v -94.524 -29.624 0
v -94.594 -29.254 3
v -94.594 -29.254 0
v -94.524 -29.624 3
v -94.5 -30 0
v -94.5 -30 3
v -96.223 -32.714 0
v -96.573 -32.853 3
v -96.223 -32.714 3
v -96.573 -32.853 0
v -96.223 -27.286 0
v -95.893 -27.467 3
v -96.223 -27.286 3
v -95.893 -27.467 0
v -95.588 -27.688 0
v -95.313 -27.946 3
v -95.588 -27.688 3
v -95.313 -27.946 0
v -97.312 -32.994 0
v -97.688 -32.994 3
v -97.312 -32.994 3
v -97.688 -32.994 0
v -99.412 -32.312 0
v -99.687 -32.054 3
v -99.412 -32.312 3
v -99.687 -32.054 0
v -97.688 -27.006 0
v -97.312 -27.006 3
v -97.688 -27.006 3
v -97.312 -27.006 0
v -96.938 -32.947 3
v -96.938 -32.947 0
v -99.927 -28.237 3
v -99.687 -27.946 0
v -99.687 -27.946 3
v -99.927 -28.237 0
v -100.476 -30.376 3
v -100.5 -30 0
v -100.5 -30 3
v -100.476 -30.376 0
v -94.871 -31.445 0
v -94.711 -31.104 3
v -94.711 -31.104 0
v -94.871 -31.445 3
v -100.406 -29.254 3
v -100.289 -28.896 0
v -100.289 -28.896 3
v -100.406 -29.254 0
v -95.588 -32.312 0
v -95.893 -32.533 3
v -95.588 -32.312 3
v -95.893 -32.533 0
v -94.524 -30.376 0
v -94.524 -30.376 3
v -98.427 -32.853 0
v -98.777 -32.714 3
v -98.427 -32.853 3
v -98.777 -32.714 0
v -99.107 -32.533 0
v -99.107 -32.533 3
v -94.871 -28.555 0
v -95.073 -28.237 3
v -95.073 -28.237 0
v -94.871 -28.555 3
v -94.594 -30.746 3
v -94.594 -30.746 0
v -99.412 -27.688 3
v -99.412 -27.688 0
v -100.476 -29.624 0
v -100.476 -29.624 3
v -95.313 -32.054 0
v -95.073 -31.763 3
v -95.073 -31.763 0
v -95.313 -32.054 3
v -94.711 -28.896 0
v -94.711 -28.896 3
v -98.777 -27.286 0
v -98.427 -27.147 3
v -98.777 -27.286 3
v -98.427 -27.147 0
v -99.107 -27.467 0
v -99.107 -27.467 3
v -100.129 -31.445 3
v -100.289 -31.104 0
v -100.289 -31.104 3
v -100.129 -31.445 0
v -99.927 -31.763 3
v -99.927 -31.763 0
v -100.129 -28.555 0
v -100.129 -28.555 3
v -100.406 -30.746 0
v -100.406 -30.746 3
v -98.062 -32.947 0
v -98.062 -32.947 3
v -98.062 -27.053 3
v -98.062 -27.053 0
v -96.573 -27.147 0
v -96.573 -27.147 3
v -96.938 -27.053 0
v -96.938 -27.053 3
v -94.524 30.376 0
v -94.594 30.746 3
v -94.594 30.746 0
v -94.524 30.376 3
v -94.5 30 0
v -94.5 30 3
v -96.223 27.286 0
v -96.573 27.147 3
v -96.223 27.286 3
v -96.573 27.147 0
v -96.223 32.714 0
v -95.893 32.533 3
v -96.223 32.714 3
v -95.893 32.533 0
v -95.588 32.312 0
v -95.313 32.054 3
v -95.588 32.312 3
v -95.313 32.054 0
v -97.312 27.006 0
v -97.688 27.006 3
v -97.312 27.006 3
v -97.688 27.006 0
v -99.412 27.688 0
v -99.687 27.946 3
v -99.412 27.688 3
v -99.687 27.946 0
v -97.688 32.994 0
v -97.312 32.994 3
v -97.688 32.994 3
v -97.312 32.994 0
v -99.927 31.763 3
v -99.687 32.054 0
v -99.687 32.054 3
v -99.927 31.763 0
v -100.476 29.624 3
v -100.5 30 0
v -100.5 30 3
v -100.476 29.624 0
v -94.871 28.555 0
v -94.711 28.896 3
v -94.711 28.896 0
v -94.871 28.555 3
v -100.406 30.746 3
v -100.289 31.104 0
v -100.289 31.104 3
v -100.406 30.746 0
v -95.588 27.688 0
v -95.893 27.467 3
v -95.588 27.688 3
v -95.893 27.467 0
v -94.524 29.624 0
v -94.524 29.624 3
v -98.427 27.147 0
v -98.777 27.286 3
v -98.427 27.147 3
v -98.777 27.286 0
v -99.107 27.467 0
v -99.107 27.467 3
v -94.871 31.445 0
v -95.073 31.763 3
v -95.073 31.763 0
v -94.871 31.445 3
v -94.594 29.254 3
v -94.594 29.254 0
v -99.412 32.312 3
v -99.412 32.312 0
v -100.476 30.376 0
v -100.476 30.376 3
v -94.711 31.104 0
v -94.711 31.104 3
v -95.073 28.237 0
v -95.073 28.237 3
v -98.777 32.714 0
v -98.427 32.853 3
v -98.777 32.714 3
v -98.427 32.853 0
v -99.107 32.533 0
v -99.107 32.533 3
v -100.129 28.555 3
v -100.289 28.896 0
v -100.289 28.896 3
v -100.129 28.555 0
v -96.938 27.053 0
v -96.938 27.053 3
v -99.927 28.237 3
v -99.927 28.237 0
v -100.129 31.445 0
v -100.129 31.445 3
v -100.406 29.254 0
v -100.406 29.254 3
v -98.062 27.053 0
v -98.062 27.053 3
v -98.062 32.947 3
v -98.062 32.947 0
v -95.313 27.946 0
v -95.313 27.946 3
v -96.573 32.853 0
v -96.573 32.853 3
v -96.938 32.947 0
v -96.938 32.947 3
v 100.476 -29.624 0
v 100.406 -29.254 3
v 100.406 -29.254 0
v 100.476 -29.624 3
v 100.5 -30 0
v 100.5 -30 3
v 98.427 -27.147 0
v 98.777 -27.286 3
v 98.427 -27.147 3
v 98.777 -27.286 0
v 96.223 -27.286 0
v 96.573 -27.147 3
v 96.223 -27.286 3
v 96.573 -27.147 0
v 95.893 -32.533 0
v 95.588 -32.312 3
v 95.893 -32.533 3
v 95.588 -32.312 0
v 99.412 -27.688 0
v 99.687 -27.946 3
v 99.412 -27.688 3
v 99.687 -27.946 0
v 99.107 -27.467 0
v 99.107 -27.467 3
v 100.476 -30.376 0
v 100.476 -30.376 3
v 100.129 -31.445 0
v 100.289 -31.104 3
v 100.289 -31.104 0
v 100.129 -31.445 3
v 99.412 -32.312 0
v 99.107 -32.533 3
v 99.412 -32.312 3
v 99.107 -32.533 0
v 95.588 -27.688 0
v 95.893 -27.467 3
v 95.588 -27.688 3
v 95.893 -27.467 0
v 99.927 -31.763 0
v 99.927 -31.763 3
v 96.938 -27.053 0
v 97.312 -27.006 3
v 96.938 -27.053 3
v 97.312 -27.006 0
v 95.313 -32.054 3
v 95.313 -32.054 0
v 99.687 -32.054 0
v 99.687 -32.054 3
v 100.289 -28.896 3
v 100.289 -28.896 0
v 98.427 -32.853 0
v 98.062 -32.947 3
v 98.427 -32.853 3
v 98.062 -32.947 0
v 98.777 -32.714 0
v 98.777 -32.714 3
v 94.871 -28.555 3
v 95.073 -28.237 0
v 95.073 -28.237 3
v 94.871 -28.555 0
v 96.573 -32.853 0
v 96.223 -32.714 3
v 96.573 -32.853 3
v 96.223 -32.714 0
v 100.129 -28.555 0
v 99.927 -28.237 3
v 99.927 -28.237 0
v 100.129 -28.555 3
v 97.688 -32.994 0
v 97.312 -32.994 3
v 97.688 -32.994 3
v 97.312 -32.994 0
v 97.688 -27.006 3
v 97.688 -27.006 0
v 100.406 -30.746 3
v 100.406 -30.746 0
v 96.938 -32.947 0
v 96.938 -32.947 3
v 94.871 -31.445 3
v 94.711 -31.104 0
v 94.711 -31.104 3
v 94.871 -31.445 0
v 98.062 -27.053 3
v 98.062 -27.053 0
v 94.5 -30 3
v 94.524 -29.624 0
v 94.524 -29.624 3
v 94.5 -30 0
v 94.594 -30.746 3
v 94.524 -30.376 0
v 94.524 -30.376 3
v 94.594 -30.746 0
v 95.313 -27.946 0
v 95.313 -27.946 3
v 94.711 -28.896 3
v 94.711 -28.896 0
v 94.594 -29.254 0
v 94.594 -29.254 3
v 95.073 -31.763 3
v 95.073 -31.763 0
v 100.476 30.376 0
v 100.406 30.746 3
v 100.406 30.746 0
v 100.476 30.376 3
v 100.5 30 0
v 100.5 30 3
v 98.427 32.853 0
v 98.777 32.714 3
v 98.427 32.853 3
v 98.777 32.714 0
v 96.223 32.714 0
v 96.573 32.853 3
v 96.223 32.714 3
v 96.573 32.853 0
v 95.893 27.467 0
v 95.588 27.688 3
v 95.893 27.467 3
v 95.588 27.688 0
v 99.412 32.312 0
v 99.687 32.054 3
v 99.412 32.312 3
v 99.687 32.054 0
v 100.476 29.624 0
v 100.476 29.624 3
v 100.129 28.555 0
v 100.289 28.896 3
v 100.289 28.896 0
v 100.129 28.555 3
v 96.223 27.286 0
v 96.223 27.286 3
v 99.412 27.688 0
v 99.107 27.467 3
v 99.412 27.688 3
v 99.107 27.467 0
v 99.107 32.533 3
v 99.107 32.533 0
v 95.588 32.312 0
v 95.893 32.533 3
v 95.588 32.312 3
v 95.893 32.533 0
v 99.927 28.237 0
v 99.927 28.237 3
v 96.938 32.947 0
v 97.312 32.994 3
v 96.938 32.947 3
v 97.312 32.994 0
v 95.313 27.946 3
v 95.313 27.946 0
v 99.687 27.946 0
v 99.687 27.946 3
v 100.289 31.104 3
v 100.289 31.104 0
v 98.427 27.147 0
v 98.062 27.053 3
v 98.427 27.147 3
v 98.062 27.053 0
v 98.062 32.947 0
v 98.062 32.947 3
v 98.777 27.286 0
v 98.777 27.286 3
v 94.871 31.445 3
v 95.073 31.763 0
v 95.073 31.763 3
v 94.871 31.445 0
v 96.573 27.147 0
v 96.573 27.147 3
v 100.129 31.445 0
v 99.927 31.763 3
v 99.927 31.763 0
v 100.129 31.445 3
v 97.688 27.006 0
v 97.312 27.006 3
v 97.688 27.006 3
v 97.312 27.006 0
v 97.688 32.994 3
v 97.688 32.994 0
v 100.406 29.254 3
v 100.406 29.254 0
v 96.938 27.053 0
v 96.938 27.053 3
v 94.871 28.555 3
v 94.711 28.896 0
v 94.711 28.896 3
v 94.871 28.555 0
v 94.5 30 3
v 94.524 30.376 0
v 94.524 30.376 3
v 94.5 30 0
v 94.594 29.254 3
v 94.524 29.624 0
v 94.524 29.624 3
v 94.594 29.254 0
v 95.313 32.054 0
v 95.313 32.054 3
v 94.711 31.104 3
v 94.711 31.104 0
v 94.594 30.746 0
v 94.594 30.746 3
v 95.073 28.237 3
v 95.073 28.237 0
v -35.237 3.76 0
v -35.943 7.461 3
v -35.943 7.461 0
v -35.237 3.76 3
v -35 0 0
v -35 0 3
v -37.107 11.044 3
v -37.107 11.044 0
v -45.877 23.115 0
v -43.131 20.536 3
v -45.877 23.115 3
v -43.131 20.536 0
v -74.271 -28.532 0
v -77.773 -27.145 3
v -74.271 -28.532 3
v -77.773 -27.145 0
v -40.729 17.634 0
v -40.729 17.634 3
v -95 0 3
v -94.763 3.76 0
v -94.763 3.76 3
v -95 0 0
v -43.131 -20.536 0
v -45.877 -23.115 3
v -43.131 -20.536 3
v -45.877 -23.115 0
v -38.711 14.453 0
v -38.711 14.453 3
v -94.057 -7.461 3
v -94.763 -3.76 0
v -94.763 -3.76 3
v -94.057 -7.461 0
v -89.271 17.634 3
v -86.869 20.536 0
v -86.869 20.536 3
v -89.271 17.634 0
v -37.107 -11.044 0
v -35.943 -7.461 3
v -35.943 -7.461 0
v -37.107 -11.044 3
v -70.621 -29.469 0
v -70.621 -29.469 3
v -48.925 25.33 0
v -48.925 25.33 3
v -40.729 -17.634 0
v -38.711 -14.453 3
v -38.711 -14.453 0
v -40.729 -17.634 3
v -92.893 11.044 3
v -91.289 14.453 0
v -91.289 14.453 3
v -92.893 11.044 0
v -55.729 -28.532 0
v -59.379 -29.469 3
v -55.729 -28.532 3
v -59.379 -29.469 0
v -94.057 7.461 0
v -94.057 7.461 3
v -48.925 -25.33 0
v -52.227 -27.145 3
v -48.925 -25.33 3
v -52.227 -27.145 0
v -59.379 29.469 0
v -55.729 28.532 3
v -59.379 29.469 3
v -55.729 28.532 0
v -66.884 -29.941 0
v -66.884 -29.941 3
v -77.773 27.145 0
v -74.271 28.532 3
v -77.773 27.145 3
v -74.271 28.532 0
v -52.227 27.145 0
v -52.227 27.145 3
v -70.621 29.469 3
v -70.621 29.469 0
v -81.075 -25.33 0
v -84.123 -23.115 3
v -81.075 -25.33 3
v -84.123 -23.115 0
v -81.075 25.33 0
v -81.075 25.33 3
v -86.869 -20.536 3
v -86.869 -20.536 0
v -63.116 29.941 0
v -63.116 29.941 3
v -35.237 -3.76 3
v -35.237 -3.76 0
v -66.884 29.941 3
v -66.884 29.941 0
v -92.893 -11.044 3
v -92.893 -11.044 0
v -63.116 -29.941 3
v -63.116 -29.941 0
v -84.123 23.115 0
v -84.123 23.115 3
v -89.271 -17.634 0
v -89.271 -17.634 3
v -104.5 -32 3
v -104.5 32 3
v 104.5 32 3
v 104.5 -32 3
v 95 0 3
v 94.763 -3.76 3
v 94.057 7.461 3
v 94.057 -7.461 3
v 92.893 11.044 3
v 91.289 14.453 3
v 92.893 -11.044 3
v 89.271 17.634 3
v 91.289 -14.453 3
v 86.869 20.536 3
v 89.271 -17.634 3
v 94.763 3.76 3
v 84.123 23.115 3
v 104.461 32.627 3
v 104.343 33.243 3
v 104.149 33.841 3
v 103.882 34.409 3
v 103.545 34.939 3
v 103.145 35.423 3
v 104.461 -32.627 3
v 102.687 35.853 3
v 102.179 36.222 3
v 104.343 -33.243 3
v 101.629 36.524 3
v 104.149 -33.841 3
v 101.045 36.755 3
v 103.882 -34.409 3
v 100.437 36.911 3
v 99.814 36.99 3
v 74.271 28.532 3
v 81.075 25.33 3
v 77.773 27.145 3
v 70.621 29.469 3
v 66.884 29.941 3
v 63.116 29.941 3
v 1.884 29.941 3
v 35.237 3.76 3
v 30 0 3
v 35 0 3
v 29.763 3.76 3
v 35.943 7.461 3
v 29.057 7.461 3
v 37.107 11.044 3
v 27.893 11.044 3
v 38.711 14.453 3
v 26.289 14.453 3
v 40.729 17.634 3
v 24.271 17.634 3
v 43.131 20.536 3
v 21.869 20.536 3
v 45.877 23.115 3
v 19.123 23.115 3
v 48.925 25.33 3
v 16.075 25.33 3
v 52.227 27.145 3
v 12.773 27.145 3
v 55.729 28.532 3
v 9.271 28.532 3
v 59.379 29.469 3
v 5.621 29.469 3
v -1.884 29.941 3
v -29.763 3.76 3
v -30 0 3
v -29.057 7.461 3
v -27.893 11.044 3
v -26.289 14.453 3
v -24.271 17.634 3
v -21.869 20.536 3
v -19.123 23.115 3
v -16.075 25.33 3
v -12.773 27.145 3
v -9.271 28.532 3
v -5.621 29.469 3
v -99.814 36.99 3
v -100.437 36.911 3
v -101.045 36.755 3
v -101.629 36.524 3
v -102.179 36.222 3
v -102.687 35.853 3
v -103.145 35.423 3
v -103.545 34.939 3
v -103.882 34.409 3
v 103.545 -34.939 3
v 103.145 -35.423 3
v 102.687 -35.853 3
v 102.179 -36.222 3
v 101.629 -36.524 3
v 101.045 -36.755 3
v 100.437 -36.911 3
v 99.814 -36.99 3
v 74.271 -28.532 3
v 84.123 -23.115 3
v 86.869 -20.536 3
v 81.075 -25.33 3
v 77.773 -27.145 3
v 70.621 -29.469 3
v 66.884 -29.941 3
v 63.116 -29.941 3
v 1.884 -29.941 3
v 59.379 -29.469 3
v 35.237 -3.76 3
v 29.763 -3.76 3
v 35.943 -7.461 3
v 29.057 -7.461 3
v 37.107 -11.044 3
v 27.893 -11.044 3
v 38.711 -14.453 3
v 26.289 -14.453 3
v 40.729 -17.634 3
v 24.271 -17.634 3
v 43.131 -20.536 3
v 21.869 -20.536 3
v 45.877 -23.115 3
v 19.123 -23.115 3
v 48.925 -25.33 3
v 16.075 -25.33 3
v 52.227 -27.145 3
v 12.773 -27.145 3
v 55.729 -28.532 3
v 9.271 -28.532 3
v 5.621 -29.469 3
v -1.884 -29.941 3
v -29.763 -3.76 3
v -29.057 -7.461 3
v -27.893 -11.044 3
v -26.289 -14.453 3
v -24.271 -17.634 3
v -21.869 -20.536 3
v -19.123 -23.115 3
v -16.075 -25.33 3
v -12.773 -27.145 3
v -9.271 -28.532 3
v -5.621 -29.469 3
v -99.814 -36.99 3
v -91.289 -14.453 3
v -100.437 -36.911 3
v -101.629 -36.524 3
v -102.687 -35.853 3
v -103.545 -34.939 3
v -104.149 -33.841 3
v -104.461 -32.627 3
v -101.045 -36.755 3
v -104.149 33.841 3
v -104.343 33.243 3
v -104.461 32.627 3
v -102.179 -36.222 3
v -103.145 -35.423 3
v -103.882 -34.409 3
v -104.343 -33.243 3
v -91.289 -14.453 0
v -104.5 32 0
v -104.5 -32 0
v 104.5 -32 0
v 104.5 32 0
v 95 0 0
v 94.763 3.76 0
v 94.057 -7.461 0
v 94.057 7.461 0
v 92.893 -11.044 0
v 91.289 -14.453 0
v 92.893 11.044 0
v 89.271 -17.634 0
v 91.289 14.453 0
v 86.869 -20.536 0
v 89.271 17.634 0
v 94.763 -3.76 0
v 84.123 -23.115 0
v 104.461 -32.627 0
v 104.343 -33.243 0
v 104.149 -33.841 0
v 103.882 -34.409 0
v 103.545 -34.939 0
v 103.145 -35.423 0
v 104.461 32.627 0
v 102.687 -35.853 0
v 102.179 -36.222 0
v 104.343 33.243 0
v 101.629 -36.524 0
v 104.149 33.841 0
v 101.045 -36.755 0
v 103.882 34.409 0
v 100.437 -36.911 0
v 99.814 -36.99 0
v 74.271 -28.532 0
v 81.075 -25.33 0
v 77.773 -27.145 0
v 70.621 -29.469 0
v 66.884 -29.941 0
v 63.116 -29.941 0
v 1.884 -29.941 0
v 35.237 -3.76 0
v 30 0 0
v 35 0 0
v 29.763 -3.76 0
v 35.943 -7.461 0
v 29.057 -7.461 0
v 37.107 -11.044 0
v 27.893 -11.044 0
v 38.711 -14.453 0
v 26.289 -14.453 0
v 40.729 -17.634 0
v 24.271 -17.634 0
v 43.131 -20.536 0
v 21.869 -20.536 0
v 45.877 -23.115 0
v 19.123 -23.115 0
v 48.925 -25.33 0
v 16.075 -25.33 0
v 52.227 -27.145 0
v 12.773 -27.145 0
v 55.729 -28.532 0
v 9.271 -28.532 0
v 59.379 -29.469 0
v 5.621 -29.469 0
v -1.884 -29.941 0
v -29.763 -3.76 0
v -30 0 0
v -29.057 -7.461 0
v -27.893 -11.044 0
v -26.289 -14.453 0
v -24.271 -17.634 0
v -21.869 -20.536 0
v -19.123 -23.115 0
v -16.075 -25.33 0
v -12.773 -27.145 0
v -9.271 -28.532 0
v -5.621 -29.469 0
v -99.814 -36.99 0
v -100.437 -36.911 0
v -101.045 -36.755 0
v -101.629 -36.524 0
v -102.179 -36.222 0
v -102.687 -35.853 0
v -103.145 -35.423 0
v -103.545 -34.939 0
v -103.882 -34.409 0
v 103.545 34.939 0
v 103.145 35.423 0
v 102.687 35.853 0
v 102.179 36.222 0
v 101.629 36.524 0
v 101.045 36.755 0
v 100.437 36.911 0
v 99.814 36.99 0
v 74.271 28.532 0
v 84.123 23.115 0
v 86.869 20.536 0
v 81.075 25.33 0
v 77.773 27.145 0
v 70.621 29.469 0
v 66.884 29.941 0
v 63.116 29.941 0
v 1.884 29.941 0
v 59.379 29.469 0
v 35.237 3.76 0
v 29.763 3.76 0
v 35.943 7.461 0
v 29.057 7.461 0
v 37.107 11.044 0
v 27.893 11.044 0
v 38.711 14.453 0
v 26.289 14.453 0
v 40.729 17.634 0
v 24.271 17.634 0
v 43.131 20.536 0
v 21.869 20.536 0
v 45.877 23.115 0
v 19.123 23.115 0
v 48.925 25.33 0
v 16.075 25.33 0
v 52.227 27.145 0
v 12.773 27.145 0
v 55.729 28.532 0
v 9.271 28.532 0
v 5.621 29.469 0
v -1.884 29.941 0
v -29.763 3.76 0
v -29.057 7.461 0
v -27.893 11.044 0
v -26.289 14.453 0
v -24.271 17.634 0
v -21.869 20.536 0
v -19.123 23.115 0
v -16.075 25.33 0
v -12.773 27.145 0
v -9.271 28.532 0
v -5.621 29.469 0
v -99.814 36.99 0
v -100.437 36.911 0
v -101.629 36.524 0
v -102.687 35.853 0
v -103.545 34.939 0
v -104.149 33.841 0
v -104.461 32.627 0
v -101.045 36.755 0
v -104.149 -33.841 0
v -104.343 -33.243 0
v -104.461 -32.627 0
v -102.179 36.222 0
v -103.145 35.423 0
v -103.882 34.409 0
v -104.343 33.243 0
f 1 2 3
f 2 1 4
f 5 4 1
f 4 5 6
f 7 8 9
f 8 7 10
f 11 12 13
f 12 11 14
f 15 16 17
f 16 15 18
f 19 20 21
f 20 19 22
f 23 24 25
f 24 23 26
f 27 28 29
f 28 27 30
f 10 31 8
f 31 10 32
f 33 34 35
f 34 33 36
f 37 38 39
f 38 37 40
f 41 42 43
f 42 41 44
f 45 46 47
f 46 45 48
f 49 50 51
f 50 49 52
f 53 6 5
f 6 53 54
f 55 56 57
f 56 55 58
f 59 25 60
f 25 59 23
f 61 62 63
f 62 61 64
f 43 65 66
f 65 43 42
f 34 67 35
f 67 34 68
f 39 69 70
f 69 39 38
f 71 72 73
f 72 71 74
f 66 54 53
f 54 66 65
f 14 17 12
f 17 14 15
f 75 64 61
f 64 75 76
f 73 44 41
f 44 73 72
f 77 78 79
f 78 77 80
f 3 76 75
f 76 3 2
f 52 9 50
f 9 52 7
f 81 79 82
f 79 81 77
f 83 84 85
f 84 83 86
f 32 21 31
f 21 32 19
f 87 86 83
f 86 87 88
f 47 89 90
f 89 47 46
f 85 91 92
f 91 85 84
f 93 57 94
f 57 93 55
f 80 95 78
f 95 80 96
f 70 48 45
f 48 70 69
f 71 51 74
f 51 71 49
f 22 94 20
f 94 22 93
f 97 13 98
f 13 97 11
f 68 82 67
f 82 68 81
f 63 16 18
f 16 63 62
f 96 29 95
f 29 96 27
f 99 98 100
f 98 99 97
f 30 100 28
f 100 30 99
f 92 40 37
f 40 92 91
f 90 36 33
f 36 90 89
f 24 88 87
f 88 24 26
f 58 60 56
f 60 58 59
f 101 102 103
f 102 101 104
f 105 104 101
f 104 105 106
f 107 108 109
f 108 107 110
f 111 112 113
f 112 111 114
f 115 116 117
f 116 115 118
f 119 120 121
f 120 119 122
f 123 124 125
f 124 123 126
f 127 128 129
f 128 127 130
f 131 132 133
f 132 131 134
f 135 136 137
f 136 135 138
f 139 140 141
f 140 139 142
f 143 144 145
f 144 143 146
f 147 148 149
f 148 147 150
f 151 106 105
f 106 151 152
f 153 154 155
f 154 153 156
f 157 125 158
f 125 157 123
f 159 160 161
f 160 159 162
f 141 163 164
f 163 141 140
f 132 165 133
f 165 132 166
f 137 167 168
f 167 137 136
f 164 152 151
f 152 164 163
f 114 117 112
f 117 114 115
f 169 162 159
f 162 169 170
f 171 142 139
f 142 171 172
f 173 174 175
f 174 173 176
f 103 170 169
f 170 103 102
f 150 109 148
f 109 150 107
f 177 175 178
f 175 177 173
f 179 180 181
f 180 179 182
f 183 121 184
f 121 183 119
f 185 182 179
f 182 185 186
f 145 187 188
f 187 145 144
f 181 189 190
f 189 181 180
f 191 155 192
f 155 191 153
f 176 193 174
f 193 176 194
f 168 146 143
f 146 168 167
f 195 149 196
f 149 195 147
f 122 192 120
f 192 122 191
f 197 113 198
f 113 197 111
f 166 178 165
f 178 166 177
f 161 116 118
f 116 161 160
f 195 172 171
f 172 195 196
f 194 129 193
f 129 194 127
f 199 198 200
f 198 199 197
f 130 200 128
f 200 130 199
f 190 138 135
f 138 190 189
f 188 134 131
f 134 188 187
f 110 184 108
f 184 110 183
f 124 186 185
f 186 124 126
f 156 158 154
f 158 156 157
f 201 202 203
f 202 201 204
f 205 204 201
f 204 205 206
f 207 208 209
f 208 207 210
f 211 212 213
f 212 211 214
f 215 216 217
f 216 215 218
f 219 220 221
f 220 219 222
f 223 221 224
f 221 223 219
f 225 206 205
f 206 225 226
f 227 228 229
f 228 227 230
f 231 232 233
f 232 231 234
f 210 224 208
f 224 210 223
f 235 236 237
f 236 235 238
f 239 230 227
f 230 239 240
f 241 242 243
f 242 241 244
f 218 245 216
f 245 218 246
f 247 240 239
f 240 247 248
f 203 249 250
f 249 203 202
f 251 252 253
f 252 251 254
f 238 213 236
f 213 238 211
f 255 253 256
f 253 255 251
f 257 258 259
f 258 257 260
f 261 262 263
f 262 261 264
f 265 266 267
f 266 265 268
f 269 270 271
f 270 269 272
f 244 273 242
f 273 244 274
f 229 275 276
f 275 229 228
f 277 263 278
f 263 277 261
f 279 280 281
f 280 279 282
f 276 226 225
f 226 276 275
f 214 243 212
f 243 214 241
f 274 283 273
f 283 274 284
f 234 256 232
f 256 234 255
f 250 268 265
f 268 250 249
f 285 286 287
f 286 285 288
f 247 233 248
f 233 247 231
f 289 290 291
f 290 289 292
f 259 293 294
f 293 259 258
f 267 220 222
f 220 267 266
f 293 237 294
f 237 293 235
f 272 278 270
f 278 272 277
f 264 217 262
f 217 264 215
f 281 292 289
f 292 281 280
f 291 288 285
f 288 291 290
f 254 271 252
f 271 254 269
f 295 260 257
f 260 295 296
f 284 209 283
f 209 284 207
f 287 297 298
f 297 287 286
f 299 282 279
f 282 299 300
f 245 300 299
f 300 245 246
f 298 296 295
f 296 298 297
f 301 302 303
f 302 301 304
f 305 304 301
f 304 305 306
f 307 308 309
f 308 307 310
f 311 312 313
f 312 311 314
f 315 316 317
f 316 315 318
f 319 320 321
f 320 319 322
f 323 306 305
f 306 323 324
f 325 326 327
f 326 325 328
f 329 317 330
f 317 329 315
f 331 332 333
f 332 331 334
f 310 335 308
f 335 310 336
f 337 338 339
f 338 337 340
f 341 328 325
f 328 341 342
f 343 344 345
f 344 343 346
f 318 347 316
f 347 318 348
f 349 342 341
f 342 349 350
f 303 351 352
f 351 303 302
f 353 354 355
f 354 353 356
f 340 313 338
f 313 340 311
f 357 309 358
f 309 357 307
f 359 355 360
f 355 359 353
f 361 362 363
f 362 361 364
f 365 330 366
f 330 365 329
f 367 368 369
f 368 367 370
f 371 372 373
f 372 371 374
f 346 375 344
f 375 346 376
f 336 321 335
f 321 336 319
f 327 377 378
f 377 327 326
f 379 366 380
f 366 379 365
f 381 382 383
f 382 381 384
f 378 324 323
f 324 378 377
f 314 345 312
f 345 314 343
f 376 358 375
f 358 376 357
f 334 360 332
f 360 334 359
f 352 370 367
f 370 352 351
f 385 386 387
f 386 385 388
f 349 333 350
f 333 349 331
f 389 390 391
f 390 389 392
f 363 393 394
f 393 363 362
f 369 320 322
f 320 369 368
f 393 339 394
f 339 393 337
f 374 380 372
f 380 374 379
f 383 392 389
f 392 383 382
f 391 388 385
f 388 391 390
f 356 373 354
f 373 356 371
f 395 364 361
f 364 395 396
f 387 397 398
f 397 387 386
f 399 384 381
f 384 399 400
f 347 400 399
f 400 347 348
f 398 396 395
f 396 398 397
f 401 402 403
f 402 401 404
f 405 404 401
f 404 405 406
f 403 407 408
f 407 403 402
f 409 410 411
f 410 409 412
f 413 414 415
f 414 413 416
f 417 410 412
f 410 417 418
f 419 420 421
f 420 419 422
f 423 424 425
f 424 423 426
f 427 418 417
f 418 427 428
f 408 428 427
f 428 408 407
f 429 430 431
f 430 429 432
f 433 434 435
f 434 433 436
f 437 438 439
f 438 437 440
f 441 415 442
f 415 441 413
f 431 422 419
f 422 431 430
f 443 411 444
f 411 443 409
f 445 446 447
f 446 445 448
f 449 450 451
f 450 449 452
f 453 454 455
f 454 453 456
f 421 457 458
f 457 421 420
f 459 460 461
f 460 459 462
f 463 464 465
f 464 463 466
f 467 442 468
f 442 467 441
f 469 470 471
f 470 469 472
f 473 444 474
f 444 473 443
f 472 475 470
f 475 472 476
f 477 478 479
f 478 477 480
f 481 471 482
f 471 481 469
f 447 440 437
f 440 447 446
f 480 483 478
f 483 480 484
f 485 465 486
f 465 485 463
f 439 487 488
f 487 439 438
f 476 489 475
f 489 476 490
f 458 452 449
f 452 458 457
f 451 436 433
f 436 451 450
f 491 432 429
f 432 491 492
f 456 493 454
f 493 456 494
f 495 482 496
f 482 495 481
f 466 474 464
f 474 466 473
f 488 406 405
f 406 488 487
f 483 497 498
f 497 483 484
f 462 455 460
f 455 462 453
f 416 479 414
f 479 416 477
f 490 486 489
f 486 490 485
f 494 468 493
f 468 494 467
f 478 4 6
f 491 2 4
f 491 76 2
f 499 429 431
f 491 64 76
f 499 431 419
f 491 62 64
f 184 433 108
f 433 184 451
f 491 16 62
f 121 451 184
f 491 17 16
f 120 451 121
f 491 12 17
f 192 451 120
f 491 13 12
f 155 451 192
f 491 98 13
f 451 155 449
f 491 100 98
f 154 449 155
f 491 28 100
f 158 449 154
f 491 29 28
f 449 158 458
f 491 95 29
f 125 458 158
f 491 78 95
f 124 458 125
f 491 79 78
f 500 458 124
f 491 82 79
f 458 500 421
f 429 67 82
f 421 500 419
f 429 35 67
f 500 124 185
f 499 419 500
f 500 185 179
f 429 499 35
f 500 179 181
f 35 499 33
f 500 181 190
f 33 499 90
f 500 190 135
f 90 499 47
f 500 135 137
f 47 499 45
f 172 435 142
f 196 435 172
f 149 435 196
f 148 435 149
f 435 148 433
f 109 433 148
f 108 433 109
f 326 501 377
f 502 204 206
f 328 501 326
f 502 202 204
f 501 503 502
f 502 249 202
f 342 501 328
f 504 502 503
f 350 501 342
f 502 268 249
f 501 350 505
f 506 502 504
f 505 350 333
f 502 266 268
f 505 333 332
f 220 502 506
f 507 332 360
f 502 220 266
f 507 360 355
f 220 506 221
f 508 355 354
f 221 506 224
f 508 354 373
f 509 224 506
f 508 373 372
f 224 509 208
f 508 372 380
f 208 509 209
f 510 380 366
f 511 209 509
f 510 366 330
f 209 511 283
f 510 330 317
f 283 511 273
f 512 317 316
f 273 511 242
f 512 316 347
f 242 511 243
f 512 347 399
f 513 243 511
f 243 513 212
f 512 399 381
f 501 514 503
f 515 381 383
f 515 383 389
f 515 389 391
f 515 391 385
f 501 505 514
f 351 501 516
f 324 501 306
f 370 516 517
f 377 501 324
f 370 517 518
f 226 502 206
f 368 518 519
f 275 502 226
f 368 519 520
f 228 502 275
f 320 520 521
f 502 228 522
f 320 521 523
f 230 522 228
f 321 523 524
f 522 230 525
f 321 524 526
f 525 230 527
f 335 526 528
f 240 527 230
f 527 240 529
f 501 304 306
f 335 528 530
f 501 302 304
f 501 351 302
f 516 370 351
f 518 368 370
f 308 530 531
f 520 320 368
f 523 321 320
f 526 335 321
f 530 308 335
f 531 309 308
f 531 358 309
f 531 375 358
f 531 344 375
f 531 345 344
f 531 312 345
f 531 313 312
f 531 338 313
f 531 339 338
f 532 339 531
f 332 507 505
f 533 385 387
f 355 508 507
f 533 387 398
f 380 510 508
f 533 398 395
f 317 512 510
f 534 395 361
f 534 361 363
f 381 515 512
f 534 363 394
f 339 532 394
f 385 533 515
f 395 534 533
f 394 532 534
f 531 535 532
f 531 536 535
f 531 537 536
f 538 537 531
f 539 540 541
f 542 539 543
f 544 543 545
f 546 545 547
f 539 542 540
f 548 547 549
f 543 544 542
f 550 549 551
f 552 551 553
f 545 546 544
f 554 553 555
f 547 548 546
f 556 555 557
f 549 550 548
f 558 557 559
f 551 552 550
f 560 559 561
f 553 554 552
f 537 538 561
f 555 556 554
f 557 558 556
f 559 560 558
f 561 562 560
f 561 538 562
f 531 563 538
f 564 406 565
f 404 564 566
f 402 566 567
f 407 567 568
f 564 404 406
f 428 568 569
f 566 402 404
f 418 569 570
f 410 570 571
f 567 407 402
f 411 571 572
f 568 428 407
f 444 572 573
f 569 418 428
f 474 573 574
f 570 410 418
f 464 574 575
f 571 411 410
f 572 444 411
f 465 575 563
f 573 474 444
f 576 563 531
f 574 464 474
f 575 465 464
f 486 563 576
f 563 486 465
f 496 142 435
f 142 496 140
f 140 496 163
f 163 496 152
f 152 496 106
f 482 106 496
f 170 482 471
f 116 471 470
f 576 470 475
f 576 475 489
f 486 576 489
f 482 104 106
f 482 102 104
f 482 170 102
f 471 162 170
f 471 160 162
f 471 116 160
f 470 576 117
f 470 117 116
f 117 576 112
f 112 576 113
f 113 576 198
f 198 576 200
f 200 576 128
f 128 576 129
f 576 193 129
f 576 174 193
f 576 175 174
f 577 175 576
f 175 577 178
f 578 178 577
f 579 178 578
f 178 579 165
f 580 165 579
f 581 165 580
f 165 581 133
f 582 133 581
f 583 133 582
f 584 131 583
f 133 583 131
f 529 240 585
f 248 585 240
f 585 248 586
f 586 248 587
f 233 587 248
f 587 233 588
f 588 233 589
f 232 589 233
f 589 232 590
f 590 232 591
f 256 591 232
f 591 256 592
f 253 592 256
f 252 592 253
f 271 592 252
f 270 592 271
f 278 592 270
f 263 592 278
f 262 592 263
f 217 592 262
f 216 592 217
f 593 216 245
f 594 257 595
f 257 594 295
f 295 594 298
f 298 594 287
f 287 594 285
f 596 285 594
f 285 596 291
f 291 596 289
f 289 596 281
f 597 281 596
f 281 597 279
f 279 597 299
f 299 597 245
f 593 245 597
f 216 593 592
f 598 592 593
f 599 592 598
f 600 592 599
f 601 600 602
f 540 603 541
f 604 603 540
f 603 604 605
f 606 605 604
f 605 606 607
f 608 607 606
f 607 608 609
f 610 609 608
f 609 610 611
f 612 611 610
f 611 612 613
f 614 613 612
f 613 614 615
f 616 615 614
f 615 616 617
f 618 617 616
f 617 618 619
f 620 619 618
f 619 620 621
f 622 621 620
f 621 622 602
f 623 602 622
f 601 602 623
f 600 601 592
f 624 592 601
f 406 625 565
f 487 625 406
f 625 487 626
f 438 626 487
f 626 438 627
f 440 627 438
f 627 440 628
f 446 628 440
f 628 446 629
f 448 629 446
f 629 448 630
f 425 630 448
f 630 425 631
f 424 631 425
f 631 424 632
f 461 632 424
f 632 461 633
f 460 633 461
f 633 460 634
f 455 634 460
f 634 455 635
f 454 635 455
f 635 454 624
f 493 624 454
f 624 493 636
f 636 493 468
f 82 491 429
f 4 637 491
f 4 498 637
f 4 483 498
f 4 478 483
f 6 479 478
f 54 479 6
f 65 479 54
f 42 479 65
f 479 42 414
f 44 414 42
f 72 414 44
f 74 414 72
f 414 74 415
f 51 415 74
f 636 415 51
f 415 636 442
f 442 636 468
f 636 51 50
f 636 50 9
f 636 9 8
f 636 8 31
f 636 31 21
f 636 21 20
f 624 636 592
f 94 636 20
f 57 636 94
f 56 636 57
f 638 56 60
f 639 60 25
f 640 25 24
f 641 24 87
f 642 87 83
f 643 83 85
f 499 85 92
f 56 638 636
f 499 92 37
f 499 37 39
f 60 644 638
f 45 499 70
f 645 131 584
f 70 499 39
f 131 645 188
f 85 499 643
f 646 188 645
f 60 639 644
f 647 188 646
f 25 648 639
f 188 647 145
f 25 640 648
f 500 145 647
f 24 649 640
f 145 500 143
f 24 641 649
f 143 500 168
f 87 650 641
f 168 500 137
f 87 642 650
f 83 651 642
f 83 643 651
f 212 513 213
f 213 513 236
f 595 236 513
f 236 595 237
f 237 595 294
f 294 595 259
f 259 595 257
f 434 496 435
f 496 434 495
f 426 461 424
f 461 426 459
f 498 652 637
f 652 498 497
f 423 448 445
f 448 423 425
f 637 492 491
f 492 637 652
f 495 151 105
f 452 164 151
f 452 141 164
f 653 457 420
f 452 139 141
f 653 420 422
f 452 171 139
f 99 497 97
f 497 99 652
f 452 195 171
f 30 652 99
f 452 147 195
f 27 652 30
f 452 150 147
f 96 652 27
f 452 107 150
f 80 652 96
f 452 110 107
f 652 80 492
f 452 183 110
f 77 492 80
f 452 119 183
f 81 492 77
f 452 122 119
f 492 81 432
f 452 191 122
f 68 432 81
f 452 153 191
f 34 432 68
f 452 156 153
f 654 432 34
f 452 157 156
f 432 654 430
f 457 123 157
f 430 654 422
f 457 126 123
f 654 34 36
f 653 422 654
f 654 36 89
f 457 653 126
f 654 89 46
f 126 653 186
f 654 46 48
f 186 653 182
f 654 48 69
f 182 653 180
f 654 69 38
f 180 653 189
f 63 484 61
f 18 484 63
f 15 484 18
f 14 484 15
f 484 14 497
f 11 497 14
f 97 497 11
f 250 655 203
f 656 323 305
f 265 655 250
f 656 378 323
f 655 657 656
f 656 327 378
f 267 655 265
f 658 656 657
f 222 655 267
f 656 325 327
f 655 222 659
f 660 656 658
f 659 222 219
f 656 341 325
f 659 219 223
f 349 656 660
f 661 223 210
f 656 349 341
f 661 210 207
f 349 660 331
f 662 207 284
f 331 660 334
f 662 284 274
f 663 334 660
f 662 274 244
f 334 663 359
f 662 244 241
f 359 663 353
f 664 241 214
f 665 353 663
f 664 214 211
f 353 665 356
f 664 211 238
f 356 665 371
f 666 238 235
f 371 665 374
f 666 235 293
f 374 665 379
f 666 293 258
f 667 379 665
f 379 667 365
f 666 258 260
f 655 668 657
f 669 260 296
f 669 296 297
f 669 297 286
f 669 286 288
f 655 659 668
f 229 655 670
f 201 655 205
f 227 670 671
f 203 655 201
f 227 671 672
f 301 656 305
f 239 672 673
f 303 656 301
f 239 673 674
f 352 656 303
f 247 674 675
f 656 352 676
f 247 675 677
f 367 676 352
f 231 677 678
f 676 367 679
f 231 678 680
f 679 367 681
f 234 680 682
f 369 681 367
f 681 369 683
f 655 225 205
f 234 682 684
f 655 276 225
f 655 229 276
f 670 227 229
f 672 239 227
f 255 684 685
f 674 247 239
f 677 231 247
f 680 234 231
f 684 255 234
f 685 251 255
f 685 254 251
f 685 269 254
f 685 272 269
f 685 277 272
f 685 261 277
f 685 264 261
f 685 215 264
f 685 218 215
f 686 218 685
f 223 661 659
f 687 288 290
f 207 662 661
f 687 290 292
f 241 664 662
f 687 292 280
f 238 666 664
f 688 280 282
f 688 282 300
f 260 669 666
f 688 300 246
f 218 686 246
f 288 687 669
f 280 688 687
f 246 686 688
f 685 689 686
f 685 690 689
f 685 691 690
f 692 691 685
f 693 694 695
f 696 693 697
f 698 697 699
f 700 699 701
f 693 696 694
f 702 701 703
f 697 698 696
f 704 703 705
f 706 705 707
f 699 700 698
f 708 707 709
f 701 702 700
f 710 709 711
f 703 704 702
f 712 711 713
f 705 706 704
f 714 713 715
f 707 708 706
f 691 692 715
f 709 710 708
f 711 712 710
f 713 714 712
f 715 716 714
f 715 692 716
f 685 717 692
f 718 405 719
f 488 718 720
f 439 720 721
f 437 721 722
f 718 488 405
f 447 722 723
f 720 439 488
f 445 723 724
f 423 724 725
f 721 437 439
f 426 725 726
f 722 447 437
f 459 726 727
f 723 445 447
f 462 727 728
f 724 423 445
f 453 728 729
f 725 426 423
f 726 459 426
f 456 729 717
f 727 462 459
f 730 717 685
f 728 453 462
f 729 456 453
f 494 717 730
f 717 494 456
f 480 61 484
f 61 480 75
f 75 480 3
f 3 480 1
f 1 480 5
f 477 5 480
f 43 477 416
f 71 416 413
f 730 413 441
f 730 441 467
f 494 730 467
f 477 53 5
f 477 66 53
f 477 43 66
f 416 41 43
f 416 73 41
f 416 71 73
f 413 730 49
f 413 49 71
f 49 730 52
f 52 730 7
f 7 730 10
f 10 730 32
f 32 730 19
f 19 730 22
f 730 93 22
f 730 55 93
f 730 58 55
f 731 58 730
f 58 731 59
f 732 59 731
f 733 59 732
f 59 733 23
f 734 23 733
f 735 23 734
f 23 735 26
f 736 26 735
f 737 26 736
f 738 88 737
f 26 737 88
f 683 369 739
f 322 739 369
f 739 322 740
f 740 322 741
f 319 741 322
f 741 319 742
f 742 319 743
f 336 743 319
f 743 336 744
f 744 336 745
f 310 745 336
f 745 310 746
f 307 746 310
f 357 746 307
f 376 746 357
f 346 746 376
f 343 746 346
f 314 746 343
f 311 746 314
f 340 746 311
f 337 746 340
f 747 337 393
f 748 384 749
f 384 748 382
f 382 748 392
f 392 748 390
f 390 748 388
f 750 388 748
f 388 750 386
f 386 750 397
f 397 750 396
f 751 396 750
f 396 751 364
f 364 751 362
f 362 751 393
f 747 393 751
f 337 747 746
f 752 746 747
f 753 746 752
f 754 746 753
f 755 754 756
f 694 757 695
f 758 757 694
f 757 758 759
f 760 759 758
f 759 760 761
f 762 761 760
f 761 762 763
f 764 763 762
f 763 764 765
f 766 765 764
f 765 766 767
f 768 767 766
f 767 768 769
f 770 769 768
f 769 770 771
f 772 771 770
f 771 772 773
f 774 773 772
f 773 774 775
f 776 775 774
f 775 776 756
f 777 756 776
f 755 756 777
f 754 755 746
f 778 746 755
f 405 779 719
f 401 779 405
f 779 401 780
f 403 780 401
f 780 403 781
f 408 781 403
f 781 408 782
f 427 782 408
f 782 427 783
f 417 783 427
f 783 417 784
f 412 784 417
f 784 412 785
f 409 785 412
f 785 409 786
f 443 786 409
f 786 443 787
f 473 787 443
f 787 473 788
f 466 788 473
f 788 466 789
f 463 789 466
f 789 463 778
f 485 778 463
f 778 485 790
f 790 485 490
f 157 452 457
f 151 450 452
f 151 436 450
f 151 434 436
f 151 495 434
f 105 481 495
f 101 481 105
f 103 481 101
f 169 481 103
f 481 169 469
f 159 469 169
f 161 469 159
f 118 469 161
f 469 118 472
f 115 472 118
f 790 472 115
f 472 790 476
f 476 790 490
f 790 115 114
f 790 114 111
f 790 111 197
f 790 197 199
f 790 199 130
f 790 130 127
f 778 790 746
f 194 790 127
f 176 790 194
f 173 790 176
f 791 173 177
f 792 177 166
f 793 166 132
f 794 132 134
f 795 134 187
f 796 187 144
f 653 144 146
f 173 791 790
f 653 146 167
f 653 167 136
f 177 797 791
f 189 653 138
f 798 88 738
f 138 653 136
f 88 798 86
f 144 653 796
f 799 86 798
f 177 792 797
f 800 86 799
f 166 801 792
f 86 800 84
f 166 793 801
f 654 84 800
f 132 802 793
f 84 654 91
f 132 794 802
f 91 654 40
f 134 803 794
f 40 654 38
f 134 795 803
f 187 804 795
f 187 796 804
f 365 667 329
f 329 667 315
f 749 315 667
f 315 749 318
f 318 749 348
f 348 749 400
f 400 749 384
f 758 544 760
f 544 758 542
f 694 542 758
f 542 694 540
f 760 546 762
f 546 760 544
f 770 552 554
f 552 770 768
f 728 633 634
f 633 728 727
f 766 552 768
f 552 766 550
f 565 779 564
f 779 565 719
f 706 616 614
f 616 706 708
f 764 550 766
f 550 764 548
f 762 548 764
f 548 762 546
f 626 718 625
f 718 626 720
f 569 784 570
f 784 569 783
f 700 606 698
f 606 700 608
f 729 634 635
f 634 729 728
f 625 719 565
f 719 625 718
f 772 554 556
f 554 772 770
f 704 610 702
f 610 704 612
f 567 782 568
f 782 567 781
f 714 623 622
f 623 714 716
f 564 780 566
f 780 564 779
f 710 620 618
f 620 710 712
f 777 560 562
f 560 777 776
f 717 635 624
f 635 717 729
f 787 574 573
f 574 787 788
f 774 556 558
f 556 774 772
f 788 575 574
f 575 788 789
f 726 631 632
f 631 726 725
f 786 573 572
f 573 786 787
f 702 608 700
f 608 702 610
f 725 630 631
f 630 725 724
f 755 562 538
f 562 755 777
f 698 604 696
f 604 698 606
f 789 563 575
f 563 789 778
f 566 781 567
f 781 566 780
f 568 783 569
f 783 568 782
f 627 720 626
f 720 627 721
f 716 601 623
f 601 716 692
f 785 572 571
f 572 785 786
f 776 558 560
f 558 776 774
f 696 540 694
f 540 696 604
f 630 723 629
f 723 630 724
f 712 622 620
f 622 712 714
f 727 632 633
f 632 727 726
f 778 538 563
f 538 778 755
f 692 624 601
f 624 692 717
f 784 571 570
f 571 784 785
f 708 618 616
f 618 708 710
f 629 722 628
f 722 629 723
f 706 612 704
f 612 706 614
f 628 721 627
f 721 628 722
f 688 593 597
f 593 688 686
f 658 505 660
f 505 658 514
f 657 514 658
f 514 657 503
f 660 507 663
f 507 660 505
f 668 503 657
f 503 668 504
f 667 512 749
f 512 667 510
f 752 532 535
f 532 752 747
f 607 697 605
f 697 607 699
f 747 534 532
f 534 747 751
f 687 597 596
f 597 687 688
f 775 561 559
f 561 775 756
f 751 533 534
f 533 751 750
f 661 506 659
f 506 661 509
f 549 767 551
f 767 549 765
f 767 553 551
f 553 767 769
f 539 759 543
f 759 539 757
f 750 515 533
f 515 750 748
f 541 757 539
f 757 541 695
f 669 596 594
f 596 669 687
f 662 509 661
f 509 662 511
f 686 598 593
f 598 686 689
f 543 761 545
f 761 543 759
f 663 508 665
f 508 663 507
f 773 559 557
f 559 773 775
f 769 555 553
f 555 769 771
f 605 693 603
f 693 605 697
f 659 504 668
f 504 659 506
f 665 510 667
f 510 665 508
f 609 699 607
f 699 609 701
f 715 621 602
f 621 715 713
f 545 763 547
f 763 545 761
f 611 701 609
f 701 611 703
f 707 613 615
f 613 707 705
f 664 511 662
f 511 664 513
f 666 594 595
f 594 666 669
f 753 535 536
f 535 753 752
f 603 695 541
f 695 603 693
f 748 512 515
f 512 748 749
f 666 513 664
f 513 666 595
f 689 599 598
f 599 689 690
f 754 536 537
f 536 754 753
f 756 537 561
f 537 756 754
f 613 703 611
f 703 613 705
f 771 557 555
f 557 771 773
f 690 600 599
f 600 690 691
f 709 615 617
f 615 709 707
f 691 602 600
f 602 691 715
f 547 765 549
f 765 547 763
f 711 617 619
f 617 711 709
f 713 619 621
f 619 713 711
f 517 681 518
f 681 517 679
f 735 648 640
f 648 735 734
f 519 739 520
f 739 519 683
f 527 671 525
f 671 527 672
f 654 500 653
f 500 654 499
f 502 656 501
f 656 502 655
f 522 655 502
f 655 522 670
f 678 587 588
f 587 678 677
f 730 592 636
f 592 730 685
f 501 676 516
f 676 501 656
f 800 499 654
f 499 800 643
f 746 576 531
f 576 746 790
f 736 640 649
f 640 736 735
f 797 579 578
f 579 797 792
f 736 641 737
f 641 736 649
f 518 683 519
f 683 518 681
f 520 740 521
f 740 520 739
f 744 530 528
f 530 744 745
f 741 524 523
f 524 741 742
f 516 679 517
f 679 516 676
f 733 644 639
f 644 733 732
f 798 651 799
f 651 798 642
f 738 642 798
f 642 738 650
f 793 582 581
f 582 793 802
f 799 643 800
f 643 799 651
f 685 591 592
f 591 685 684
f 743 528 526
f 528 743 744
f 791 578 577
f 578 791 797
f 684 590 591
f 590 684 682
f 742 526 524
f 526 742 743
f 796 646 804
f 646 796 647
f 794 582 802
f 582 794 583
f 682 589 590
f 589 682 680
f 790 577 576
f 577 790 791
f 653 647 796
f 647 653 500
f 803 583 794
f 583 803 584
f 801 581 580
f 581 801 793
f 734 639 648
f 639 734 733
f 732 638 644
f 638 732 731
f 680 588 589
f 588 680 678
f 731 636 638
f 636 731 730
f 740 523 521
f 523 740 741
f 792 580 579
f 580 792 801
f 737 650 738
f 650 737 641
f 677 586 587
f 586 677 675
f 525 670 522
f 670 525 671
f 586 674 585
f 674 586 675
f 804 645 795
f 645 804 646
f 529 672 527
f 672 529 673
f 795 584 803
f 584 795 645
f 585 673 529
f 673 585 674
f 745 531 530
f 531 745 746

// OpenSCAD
$fn = 50;


difference() {
	union() {
		hull() {
			translate(v = [-99.5000000000, 32.0000000000, 0]) {
				cylinder(h = 3, r = 5);
			}
			translate(v = [99.5000000000, 32.0000000000, 0]) {
				cylinder(h = 3, r = 5);
			}
			translate(v = [-99.5000000000, -32.0000000000, 0]) {
				cylinder(h = 3, r = 5);
			}
			translate(v = [99.5000000000, -32.0000000000, 0]) {
				cylinder(h = 3, r = 5);
			}
		}
	}
	union() {
		#translate(v = [-97.5000000000, -30.0000000000, -100.0000000000]) {
			cylinder(h = 200, r = 3.0000000000);
		}
		#translate(v = [-97.5000000000, 30.0000000000, -100.0000000000]) {
			cylinder(h = 200, r = 3.0000000000);
		}
		#translate(v = [97.5000000000, -30.0000000000, -100.0000000000]) {
			cylinder(h = 200, r = 3.0000000000);
		}
		#translate(v = [97.5000000000, 30.0000000000, -100.0000000000]) {
			cylinder(h = 200, r = 3.0000000000);
		}
		#translate(v = [-65.0000000000, 0, 0]) {
			cylinder(h = 3, r = 30.0000000000);
		}
		#cylinder(h = 3, r = 30.0000000000);
		#translate(v = [65.0000000000, 0, 0]) {
			cylinder(h = 3, r = 30.0000000000);
		}
	}
}
